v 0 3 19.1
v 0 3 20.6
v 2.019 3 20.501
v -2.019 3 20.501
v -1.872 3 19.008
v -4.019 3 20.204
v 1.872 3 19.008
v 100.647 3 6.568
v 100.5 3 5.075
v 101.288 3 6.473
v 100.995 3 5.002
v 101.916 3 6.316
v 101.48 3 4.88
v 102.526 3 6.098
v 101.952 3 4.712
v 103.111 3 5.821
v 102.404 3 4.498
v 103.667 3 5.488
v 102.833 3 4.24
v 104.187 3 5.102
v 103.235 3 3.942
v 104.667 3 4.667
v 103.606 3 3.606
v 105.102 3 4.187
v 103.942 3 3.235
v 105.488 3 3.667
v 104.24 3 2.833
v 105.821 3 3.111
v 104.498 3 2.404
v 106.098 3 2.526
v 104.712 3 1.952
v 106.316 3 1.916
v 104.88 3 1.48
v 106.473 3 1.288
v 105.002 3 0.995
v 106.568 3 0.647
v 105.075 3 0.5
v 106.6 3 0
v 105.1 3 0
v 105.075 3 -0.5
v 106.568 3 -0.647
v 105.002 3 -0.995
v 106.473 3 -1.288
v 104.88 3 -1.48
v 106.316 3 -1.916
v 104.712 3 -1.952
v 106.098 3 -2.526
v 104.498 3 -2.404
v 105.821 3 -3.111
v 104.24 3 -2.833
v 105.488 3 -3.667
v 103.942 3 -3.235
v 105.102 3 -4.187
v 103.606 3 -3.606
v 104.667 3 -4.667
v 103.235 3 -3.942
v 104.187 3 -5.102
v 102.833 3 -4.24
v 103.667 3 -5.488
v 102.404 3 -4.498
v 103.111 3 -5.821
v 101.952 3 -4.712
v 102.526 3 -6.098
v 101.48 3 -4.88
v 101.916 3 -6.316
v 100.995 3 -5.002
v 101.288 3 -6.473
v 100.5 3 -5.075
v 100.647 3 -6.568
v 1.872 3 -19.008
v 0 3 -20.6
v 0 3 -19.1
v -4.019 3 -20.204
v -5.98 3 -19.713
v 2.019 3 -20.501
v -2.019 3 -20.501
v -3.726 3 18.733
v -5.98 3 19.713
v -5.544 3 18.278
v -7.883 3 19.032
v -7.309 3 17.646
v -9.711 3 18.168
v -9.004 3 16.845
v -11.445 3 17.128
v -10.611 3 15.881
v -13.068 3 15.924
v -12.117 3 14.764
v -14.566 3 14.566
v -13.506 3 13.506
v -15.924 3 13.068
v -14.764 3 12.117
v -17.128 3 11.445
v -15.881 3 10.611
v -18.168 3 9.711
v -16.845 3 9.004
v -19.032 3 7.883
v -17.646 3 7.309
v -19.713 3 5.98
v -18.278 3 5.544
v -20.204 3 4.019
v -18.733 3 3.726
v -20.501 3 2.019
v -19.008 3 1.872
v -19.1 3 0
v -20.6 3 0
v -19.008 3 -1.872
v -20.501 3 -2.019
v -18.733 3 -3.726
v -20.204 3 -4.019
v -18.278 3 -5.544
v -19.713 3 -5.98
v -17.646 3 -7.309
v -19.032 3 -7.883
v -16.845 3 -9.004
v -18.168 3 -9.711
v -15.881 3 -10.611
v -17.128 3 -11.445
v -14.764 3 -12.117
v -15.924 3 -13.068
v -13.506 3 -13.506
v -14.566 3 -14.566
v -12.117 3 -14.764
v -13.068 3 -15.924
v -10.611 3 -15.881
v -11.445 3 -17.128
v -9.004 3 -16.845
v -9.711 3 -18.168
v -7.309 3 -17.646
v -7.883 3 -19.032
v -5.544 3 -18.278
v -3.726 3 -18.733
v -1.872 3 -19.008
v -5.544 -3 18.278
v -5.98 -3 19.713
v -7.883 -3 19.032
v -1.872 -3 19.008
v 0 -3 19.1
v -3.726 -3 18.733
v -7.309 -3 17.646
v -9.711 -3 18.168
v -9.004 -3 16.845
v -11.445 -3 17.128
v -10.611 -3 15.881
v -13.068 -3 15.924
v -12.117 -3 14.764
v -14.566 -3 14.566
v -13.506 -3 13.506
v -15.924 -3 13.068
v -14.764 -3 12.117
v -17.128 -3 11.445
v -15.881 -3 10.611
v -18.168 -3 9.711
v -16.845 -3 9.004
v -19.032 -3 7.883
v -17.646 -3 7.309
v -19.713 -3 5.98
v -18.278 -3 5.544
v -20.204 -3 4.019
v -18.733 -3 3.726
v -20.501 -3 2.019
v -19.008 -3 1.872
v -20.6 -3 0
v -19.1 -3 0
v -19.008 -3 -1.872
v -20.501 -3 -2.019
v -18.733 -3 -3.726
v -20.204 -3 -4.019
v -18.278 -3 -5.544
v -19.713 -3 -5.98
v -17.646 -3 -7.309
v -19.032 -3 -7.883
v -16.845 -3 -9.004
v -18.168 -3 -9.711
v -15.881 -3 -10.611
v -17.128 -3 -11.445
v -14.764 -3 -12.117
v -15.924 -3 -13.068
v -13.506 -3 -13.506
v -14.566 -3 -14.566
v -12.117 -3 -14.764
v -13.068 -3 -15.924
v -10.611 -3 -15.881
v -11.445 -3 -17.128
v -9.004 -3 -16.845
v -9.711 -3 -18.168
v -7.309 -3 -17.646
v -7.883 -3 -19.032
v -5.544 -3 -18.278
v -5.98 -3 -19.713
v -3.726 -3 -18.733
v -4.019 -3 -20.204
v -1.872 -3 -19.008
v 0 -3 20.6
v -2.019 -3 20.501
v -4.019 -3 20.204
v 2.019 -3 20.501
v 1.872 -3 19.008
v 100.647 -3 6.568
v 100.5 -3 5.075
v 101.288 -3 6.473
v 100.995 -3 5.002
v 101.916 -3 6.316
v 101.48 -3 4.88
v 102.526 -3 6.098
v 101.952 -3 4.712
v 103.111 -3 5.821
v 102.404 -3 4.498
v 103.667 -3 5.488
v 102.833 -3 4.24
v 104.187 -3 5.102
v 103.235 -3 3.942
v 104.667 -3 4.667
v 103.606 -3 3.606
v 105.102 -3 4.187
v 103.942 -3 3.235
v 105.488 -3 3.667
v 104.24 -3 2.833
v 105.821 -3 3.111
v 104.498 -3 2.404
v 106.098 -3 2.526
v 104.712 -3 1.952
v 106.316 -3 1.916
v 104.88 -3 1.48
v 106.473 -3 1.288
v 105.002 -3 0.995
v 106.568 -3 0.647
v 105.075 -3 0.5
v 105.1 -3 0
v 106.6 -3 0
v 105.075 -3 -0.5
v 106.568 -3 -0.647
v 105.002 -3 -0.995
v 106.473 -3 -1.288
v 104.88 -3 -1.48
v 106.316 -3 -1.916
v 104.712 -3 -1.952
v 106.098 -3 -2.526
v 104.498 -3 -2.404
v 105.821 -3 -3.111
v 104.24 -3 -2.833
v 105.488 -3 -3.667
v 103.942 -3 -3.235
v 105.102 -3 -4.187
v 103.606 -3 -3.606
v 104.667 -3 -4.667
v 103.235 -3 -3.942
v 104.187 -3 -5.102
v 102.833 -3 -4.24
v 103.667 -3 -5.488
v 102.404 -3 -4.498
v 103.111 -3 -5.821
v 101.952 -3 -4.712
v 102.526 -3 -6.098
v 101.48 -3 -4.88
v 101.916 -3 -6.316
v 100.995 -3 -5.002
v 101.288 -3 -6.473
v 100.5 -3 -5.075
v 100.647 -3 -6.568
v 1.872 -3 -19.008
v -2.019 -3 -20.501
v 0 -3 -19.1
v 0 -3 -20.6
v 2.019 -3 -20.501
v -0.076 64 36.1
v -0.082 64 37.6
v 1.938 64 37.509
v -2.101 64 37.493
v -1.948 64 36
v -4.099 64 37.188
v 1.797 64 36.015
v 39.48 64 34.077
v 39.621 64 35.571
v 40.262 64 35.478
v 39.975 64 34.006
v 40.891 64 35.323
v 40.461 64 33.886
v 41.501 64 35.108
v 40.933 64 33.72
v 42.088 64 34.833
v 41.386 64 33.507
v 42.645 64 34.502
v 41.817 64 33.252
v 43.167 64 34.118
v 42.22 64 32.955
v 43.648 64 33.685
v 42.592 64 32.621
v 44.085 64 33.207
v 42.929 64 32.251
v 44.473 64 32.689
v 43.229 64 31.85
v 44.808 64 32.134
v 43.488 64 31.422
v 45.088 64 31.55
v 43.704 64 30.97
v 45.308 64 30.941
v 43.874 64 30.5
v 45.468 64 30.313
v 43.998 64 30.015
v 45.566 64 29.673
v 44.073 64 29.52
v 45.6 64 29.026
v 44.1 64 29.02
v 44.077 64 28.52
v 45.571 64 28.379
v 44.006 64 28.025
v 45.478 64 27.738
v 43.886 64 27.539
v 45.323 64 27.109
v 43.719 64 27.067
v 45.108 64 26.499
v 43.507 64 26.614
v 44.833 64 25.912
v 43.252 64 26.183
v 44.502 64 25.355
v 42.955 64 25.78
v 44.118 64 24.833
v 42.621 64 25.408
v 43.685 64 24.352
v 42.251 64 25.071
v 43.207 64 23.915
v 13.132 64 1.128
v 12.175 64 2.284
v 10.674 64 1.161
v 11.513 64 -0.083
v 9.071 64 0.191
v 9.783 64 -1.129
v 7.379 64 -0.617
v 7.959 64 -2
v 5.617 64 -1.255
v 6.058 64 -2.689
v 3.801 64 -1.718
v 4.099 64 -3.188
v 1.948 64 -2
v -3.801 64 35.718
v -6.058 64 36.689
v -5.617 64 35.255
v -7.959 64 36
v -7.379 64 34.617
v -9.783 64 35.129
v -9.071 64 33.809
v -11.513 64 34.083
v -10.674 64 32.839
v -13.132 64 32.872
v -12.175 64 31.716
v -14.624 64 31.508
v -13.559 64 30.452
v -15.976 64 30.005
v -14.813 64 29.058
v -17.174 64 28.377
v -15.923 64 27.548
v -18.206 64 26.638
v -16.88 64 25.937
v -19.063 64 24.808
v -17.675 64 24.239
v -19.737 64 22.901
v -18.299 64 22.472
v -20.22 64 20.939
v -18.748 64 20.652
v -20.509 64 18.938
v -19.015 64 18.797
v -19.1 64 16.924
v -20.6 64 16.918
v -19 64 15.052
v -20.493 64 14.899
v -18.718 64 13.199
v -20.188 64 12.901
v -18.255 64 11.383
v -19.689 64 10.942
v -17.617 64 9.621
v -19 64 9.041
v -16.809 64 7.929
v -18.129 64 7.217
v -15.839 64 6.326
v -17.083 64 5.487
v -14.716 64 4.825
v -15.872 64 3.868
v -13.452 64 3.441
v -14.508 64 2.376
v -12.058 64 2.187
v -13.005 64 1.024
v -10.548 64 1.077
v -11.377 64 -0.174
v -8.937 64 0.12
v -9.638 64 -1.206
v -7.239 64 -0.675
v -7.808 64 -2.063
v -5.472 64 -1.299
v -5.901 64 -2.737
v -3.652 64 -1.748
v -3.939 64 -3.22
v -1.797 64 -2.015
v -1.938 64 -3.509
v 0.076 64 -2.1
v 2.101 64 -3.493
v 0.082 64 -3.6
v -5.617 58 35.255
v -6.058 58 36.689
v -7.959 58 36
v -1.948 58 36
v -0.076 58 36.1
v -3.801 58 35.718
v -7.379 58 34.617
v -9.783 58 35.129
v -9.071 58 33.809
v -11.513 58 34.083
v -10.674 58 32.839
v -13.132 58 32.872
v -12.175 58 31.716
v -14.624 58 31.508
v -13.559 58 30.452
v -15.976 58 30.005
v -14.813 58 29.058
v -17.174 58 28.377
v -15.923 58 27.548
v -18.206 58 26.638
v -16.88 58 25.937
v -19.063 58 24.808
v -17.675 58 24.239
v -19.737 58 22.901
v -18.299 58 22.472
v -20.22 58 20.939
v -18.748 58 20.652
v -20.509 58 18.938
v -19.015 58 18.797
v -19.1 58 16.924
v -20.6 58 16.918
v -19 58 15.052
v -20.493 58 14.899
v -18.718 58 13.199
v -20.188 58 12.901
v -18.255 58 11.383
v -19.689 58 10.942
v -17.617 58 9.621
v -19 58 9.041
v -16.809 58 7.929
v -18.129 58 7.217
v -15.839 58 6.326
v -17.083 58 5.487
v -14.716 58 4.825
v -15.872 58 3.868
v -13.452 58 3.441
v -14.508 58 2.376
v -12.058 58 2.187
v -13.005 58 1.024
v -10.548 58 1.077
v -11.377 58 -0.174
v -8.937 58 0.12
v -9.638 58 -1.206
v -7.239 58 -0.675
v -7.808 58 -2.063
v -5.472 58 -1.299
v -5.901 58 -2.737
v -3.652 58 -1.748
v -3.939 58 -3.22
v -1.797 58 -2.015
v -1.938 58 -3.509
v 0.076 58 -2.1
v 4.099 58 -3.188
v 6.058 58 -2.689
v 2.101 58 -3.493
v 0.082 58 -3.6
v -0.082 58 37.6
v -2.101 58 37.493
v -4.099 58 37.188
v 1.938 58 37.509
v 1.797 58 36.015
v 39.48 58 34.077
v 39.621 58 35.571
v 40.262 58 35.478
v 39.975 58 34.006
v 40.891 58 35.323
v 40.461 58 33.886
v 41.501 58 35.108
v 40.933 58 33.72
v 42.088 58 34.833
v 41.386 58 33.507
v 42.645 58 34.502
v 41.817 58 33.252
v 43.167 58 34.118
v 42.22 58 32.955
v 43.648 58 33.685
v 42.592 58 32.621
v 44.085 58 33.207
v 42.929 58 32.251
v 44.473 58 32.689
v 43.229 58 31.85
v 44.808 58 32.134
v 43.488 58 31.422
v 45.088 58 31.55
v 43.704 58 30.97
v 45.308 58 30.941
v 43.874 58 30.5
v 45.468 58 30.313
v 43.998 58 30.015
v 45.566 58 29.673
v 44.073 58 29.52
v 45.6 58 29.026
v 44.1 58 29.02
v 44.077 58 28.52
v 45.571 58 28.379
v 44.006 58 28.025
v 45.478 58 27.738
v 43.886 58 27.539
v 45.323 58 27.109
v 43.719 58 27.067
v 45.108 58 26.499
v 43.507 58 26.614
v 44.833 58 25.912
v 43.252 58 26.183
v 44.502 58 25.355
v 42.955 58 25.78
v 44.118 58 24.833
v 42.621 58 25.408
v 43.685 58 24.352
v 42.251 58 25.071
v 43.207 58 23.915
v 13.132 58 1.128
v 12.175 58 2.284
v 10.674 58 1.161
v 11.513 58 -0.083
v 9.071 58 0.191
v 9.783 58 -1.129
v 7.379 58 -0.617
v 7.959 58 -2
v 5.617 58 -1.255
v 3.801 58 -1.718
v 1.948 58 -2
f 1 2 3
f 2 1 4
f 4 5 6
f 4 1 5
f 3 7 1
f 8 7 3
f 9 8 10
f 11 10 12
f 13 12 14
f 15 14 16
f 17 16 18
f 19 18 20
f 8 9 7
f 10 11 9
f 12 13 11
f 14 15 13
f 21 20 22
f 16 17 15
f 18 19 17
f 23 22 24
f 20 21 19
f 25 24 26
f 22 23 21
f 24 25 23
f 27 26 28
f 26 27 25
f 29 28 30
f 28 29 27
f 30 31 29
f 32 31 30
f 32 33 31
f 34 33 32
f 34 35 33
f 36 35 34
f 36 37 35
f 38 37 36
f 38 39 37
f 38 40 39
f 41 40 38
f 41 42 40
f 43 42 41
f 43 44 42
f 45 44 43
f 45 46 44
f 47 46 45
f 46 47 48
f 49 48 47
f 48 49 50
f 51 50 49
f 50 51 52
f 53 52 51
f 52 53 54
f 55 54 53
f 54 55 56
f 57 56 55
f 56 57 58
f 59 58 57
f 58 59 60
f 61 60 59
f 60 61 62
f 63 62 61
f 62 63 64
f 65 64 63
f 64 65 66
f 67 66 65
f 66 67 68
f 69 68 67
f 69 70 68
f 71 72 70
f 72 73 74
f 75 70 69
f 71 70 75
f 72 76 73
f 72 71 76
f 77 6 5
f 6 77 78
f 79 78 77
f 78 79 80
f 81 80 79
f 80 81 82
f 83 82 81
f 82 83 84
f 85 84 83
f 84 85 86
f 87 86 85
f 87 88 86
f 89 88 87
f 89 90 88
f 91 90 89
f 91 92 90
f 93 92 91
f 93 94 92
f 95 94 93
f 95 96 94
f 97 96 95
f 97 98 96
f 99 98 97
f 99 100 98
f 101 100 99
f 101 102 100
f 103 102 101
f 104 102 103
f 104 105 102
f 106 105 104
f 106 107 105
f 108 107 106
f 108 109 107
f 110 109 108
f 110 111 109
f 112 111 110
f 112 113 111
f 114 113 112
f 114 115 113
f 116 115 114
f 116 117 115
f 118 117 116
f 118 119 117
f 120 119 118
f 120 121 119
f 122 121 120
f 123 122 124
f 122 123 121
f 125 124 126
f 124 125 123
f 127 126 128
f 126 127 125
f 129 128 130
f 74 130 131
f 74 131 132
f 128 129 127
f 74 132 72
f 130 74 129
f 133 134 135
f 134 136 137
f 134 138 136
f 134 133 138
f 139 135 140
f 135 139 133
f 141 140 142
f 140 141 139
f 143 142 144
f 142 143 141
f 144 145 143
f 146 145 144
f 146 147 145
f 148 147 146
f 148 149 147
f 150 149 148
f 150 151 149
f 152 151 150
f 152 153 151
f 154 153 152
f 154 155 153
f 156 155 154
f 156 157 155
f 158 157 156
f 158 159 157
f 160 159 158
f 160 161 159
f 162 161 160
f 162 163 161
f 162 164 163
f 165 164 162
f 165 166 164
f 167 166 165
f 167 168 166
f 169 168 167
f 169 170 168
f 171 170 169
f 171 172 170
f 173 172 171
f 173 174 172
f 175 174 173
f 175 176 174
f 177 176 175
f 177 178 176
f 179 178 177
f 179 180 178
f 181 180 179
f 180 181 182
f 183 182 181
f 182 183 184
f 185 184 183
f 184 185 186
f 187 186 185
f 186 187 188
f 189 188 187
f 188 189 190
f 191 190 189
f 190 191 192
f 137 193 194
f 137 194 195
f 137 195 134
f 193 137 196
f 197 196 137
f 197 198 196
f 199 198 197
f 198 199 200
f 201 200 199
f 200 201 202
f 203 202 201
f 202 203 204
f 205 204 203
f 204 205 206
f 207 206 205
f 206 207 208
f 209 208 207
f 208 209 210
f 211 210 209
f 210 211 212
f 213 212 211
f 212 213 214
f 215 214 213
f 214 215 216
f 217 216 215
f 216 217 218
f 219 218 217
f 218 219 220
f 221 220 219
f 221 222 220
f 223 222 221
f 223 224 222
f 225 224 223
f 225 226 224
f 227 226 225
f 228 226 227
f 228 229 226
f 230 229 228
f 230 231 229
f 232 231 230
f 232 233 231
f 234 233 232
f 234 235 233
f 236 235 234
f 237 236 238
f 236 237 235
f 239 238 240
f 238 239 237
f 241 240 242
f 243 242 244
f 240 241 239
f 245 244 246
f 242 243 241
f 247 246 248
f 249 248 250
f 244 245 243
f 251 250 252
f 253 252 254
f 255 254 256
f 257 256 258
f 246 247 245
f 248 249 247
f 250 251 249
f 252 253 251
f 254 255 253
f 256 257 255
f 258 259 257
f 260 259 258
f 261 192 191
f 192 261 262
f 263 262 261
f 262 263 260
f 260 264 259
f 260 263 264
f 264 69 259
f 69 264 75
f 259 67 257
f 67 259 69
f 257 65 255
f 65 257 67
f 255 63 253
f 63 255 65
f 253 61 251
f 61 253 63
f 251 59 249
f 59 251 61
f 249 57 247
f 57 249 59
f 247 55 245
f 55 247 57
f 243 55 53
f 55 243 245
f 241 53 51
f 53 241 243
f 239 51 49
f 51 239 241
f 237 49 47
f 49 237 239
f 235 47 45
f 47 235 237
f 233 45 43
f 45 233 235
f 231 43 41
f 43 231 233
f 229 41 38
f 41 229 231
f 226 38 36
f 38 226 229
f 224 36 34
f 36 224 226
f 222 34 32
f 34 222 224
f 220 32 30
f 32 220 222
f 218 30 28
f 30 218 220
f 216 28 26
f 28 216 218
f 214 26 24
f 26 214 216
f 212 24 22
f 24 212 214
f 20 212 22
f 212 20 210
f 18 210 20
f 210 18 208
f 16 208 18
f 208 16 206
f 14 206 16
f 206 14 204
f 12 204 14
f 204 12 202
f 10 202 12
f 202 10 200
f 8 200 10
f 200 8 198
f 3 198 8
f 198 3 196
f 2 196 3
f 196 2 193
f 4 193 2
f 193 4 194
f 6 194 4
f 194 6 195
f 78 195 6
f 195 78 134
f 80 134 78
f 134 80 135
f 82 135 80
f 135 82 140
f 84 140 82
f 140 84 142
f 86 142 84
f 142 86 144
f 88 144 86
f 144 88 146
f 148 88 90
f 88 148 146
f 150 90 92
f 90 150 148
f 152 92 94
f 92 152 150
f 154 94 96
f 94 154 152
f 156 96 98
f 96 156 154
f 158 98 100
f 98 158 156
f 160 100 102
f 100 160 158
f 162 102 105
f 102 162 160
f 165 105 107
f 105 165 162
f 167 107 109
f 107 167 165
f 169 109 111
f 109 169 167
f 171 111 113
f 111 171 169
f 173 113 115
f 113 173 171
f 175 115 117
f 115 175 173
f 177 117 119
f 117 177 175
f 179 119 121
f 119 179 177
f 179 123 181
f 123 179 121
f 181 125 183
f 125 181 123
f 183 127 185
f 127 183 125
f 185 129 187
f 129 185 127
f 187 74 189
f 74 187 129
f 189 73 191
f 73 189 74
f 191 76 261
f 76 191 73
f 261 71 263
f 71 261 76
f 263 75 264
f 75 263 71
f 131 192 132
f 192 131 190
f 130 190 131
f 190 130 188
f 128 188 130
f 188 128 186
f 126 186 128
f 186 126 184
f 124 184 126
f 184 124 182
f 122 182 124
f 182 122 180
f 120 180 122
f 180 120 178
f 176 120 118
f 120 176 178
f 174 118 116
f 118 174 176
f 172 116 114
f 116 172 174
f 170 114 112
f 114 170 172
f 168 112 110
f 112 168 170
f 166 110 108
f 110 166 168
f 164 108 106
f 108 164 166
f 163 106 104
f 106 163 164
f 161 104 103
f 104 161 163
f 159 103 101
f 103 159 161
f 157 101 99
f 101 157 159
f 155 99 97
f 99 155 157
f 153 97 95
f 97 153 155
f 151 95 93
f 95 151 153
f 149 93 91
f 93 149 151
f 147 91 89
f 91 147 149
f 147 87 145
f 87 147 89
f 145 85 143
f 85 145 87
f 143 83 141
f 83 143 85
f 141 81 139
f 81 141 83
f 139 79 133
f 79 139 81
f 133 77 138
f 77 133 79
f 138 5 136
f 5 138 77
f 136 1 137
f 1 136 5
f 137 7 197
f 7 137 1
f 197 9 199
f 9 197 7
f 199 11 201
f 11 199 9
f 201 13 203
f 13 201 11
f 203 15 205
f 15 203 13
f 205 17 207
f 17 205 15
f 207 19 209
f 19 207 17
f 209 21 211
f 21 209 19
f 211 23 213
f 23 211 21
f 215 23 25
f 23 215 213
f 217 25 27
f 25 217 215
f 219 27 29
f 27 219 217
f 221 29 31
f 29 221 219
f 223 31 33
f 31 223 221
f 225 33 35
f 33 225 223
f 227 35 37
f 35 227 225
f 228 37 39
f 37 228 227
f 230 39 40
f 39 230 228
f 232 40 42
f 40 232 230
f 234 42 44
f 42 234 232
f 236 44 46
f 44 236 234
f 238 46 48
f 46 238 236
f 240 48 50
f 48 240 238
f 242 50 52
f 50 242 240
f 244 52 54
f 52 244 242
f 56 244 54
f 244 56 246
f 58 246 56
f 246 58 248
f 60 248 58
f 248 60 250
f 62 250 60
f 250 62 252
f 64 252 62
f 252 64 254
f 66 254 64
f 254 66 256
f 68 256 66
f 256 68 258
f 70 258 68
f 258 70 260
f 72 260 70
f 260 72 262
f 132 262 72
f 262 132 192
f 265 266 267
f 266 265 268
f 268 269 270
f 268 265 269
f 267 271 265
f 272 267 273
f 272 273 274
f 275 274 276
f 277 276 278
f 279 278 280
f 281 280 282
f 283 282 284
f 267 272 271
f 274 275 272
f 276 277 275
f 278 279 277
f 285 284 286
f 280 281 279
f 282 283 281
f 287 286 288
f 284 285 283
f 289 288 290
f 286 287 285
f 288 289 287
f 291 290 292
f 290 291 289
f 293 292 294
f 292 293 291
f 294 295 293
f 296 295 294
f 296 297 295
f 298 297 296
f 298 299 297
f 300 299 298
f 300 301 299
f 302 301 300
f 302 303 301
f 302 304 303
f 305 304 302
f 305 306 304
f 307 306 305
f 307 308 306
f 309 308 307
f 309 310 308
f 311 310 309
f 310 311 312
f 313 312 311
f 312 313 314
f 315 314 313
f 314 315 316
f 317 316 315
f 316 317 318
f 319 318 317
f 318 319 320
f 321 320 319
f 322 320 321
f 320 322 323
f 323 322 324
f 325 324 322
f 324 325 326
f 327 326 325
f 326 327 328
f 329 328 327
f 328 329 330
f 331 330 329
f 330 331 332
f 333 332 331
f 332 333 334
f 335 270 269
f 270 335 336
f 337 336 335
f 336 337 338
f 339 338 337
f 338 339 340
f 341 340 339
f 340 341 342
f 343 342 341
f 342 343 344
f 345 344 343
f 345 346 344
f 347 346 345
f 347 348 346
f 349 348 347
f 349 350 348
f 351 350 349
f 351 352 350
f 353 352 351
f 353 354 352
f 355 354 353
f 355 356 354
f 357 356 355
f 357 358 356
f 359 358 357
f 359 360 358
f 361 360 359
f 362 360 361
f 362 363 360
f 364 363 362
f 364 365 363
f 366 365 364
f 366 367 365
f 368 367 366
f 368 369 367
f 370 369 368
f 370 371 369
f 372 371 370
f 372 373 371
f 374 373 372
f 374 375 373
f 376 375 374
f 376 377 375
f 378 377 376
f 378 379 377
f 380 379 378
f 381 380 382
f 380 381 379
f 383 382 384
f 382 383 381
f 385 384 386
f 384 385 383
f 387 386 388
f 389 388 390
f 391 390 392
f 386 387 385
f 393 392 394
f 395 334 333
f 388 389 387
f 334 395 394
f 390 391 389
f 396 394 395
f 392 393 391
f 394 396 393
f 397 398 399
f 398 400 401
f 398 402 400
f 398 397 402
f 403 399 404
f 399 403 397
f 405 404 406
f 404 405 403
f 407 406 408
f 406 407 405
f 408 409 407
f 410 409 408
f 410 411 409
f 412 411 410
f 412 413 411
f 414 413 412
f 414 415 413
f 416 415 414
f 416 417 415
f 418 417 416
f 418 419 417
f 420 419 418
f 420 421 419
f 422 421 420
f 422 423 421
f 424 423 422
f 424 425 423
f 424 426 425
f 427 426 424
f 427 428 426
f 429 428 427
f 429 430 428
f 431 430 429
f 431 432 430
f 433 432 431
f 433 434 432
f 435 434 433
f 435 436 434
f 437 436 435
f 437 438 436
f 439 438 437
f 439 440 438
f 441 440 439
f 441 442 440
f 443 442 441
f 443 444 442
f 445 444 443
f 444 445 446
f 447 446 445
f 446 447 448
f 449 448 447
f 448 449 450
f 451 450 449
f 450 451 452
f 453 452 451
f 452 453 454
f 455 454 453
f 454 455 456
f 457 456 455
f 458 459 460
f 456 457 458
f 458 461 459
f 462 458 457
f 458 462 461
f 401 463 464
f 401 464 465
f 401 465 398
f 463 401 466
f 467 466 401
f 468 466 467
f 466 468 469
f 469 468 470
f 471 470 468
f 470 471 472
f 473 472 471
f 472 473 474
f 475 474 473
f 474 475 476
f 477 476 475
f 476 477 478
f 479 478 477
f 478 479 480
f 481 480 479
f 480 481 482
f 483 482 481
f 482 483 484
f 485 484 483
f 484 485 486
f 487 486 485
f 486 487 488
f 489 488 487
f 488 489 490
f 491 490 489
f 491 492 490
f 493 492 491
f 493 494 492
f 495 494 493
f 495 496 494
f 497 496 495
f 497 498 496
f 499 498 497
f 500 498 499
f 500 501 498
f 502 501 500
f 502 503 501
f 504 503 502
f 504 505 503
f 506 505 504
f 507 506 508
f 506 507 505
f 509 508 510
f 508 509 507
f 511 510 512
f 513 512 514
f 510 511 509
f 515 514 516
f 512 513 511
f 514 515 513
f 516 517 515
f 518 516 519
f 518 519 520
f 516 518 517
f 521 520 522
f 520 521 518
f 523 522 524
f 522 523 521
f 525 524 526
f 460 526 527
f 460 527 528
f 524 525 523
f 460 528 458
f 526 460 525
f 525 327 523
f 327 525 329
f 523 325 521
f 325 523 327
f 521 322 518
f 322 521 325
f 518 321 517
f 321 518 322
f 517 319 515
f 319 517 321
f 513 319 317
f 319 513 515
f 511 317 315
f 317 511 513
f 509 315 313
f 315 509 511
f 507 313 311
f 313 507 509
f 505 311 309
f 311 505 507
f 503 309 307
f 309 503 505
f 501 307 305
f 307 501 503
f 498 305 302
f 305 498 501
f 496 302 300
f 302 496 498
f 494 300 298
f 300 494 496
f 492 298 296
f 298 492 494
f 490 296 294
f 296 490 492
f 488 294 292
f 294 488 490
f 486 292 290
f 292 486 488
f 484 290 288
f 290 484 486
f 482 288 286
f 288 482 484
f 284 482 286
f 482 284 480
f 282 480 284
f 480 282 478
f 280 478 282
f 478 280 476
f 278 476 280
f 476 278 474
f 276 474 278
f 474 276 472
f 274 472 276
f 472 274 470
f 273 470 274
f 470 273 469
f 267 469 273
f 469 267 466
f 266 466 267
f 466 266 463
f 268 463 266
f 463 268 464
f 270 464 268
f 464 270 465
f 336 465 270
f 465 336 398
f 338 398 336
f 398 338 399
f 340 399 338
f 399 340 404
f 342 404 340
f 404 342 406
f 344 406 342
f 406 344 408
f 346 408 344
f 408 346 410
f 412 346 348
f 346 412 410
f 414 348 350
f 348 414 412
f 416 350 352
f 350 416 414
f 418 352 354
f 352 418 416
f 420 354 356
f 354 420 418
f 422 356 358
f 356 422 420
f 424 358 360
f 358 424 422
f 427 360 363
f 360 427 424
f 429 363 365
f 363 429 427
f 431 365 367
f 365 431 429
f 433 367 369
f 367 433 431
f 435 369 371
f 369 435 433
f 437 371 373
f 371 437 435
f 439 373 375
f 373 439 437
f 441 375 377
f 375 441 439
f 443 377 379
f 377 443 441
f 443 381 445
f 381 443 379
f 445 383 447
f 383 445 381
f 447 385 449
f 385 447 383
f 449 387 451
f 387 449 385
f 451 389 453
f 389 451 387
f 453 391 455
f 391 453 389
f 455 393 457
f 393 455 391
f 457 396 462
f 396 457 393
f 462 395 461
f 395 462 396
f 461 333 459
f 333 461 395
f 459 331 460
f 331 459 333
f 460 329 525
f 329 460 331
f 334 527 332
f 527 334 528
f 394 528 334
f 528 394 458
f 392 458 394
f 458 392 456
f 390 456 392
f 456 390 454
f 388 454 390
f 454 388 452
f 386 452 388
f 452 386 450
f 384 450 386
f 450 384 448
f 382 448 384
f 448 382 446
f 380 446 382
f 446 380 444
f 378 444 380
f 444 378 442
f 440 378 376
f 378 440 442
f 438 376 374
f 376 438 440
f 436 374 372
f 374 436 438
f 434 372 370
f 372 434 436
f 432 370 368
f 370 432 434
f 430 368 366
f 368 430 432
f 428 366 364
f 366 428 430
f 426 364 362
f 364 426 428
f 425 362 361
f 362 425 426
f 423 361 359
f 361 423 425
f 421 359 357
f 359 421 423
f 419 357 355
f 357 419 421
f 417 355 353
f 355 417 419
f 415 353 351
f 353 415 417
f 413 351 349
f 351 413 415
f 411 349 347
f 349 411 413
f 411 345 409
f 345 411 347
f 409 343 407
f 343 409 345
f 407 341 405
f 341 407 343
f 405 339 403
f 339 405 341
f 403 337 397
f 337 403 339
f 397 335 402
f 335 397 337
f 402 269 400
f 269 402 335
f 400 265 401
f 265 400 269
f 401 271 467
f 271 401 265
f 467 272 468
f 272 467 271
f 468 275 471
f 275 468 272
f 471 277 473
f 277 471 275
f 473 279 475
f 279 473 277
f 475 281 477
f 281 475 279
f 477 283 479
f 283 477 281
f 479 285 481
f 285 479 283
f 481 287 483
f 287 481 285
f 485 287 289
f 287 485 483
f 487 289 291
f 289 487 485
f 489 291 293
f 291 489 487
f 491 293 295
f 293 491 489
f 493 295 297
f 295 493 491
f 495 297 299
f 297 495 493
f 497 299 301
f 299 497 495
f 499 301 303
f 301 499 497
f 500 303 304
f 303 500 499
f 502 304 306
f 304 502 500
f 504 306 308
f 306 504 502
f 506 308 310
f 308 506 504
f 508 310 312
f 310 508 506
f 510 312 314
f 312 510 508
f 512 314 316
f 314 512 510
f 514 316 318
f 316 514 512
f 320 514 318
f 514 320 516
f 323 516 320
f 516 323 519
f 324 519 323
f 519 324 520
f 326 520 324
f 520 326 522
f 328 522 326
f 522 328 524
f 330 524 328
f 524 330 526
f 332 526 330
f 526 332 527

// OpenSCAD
// =======================================================================
// UNIFIED DUAL-HULL PARAMETRIC 3D TIMING BELT MODULE (YOUR INSANELY SMART METHOD)
// =======================================================================

$fn=64;


// =======================================================================
// FIXED 3D TIMING BELT MODULE (VERTICAL STANDING WALLS)
// =======================================================================

$fn=64;

module gt2_belt(p1=[0,0,0], p2=[100,0,0], r1=6.37, r2=6.37, width=6, thickness=1.5) {
    vec = p2 - p1;
    dist = norm(vec);
    
    if (dist > 0.001) {
        translate(p1)
        rotate([0, 0, atan2(vec[1], vec[0])])              // Yaw rotation (Z-axis)
        rotate([0, -atan2(vec[2], norm([vec[0], vec[1]])), 0]) // Pitch rotation (Y-axis)
        rotate([90, 0, 0])                                 // FIXED: Rolls the belt 90° so it stands upright!
        {
            color("DimGray", 0.8)
            linear_extrude(height=width, center=true) {
                difference() {
                    // Outer rubber band hull boundary
                    hull() {
                        circle(r=r1 + thickness);
                        translate([dist, 0]) circle(r=r2 + thickness);
                    }
                    // Inner tooth clearance track hull subtraction
                    hull() {
                        circle(r=r1);
                        translate([dist, 0]) circle(r=r2);
                    }
                } 
            } 
        } 
    } 
}




// =======================================================================
// TESTING EXAMPLES (Both render completely solid now!)
// =======================================================================

// Example 1: Classic horizontal mismatched pulleys
gt2_belt(p1=[0,0,0], p2=[100,0,0], r1=19.1, r2=5.1, width=6);

// Example 2: Your actual 3D sloped stepper motor path layout!
translate([0, 50, 0])
    gt2_belt(p1=[0,11,17], p2=[39,11,29], r1=19.1, r2=5.1, width=6);
